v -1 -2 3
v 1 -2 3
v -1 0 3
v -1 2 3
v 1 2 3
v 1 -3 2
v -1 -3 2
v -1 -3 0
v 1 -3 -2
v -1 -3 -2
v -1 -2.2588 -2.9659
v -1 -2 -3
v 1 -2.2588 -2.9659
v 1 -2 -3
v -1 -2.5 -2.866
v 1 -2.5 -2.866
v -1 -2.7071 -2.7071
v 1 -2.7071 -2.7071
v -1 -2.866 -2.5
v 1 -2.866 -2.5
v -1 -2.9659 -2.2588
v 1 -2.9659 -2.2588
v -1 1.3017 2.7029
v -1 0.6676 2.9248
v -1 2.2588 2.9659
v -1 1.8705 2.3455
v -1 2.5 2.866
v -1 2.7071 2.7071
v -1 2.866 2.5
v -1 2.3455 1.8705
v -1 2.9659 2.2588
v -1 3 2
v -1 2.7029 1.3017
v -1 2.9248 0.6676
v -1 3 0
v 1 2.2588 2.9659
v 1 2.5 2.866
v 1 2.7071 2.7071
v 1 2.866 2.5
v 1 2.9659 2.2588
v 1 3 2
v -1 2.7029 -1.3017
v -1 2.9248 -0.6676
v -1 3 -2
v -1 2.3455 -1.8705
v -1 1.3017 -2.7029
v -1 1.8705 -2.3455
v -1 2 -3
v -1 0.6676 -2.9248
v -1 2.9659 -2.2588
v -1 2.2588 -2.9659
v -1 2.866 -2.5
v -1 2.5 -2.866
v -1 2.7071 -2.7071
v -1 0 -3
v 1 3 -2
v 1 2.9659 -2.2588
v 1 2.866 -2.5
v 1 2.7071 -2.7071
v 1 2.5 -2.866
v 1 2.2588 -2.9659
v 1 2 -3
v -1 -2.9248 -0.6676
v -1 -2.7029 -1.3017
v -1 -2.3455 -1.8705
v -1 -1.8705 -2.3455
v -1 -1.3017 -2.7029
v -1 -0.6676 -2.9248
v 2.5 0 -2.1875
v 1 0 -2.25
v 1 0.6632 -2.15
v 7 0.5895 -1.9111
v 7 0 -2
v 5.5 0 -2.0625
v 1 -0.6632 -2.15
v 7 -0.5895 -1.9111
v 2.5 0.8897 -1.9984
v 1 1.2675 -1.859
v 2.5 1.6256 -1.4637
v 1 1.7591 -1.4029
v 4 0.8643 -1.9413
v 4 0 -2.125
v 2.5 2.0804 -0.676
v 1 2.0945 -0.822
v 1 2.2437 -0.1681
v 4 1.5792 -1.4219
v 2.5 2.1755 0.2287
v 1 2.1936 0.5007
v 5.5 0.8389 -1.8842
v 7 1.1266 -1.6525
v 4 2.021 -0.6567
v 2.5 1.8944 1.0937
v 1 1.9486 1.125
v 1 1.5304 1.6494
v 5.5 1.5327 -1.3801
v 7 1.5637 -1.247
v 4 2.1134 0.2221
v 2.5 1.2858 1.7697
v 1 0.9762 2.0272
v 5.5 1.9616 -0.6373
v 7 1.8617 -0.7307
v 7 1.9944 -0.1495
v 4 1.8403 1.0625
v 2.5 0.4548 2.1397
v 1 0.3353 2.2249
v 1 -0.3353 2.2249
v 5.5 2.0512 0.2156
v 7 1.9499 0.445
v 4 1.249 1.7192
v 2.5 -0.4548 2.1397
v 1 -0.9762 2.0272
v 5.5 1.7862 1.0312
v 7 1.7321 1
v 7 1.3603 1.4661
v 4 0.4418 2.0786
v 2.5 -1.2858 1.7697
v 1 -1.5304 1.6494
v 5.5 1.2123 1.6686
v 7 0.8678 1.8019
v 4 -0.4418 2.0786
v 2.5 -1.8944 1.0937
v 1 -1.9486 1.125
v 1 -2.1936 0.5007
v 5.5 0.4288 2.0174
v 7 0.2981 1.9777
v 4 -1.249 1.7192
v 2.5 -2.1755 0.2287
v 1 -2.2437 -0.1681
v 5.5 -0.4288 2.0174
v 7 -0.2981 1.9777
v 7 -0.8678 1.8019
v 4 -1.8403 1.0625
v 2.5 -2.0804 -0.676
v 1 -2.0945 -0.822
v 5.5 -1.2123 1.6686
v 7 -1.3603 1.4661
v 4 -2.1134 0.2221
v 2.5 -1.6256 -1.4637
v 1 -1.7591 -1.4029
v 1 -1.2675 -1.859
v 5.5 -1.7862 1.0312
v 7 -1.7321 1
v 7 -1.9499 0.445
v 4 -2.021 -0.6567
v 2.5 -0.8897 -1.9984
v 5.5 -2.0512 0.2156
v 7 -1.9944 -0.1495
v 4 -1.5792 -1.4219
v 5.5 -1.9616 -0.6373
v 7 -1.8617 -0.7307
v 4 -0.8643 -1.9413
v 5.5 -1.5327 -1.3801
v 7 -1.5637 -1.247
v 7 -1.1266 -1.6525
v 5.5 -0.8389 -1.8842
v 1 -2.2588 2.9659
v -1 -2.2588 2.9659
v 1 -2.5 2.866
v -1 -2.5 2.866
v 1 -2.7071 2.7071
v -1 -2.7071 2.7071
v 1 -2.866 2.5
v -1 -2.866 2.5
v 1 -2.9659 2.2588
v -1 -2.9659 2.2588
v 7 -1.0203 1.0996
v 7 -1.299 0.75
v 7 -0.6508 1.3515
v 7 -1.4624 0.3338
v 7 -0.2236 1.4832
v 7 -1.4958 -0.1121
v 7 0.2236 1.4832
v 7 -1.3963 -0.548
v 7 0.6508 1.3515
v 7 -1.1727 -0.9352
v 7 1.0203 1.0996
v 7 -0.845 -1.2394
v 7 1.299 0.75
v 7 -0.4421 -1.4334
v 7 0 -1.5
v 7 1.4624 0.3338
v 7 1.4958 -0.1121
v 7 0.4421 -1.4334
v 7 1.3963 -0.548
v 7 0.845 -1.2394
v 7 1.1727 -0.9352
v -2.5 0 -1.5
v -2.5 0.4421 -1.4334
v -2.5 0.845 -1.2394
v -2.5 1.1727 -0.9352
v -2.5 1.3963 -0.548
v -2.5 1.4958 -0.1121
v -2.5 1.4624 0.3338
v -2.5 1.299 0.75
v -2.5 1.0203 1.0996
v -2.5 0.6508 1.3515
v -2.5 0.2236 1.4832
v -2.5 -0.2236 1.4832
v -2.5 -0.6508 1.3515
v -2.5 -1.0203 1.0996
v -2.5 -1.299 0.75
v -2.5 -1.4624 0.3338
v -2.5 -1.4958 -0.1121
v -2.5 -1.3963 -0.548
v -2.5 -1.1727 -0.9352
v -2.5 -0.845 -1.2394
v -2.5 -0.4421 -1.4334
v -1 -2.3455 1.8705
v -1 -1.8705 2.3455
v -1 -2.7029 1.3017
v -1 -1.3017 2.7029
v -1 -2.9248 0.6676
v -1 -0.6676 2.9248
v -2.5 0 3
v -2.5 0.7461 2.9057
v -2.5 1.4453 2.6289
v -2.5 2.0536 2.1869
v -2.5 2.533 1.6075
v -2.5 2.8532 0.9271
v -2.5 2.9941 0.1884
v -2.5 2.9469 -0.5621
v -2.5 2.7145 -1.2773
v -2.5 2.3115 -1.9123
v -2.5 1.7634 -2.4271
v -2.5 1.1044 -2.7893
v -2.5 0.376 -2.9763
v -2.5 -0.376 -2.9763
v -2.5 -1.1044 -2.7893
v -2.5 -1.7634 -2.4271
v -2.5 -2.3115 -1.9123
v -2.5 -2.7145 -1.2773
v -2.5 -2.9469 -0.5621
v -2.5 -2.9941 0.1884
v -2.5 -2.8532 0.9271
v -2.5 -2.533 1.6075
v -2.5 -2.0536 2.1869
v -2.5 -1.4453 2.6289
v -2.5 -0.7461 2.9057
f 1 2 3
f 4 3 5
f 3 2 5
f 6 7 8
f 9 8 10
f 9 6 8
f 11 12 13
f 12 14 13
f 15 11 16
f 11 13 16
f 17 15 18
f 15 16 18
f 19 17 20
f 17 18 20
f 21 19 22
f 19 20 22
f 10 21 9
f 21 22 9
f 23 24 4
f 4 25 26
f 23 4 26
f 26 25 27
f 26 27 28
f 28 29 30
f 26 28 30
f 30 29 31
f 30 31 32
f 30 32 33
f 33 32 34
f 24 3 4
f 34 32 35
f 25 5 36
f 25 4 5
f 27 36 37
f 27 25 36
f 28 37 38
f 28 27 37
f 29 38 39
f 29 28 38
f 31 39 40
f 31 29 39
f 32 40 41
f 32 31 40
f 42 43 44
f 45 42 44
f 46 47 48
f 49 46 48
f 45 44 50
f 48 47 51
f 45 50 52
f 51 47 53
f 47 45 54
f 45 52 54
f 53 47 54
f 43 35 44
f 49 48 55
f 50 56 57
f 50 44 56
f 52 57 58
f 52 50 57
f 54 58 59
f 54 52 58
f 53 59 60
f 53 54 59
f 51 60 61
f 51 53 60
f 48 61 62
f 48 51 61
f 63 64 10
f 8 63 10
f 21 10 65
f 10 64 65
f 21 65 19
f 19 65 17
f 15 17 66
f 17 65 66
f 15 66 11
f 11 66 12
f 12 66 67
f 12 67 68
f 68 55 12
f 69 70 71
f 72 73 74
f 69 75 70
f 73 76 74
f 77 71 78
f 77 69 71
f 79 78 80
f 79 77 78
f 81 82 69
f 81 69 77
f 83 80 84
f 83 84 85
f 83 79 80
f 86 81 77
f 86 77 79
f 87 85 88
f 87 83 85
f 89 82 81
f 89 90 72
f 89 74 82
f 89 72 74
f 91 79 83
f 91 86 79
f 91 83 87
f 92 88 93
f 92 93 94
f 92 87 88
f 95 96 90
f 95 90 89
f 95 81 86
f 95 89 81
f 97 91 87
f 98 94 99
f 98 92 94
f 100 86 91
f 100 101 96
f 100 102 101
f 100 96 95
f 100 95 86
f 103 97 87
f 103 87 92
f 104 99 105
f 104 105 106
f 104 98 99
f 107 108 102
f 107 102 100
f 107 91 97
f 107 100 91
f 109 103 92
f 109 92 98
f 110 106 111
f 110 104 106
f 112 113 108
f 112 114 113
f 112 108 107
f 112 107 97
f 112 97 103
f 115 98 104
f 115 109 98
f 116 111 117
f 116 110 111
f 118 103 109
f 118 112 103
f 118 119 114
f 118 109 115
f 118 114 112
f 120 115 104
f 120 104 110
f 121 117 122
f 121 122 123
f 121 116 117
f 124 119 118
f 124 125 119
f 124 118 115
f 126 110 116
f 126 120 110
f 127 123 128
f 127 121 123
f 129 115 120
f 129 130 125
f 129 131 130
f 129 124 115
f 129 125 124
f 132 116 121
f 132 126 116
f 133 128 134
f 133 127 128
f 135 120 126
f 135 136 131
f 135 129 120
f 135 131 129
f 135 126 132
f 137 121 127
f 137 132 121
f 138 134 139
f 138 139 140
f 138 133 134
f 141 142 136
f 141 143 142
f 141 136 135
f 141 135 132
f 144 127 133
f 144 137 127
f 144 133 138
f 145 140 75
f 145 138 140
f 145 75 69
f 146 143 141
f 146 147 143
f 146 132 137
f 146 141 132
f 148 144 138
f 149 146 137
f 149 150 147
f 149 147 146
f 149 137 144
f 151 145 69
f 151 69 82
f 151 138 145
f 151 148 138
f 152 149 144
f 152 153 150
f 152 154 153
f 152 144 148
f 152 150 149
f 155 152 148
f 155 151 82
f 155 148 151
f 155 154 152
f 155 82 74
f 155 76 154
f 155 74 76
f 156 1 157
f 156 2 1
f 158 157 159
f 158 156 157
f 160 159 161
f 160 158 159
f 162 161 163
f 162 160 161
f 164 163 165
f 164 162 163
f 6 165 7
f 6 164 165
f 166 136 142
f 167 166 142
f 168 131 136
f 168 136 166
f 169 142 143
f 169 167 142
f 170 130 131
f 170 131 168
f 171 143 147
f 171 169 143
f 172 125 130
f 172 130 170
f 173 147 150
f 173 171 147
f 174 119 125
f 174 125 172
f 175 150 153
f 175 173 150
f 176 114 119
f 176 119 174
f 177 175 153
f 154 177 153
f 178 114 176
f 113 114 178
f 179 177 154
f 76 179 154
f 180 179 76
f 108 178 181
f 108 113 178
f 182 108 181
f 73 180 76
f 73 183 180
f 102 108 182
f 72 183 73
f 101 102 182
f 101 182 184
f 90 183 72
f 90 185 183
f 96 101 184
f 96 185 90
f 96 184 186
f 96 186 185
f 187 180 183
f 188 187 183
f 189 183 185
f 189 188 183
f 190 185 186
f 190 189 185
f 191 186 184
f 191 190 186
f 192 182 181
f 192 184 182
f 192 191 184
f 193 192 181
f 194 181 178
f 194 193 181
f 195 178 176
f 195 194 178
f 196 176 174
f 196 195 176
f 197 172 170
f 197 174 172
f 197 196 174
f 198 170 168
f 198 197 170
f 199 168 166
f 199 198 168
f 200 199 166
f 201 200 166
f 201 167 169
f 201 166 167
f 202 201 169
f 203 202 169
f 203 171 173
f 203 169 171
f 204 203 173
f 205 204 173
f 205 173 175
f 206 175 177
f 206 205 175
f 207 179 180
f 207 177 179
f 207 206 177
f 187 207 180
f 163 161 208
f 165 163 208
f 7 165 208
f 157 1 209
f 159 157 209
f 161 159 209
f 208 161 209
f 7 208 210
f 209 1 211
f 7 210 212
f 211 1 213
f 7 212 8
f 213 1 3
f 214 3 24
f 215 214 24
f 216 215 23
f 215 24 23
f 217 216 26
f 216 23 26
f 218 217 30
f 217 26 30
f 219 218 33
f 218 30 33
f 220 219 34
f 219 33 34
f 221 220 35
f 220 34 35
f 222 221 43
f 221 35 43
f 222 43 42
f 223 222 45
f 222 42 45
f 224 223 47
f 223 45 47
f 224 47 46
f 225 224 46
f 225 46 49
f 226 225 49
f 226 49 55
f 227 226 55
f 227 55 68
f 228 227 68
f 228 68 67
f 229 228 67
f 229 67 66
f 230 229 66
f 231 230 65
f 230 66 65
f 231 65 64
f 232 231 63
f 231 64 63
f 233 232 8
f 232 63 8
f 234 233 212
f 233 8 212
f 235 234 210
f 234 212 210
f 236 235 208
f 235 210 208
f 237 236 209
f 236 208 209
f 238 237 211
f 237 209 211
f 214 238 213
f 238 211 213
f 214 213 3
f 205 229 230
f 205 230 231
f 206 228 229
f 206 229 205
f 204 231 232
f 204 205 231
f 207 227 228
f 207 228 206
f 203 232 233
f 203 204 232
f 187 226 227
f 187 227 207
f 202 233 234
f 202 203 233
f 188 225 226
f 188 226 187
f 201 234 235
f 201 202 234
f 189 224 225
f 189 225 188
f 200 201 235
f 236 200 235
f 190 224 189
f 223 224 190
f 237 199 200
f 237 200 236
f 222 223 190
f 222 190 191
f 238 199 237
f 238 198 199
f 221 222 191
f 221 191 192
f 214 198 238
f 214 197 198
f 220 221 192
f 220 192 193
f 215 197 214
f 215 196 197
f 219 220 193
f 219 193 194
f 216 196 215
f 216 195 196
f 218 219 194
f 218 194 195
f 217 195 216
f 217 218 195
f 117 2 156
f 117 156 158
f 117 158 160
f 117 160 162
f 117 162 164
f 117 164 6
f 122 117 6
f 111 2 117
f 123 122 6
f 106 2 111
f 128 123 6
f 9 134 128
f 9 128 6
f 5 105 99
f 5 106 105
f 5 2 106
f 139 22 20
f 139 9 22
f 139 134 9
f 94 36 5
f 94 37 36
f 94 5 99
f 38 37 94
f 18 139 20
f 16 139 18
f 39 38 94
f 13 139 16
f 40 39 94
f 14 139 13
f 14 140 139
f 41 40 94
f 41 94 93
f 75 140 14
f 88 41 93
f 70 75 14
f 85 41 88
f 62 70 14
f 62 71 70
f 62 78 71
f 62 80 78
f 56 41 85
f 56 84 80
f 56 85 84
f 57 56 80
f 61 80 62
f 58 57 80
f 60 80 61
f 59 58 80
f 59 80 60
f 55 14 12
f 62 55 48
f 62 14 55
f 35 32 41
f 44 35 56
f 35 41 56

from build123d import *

# Parameters (mm, degrees)
BASES_W                     = 6
BASES_H                     = 6
BASE_DEPTH                  = 1
INSIDEWIREHOLDINGBODYS_R    = 3
INSIDEWIREHOLDINGBODY_DEPTH = 1.5
FRONTFACES_R                = 2.25
REARFACES_R                 = 2
HOLE_DEPTH                  = 9.185352857
HOLE_DEPTH_BACK             = 9.185352857
HOLES_R                     = 1.5
BASEFILLET_R                = 1


with BuildPart() as part:
    # BaseS → Base (new, symmetric)
    with BuildSketch(Plane(origin=(0, 0, 0), x_dir=(0, 0, -1), z_dir=(1, 0, 0))):
        Rectangle(BASES_W, BASES_H)
    extrude(amount=BASE_DEPTH, both=True)

    # InsideWireHoldingBodyS → InsideWireHoldingBody (add)
    with BuildSketch(Plane.ZY.offset(1)):
        Circle(INSIDEWIREHOLDINGBODYS_R)
    extrude(amount=INSIDEWIREHOLDINGBODY_DEPTH)

    # FrontFaceS → StrainReliefBody section 0
    with BuildSketch(Plane(origin=(1, 0, 0), x_dir=(0, 0, -1), z_dir=(1, 0, 0))):
        Circle(FRONTFACES_R)
    # RearFaceS → StrainReliefBody section 1
    with BuildSketch(Plane(origin=(7, 0, 0), x_dir=(0, 0, -1), z_dir=(1, 0, 0))):
        Circle(REARFACES_R)
    loft()

    # HoleS → Hole (cut, two sides: drawn at the far end of the back side and taken through both)
    with BuildSketch(Plane(origin=(0, 0, 0), x_dir=(0, 0, -1), z_dir=(1, 0, 0)).offset(-HOLE_DEPTH_BACK)):
        Circle(HOLES_R)
    extrude(amount=HOLE_DEPTH + HOLE_DEPTH_BACK, mode=Mode.SUBTRACT)

    # BaseFillet
    basefillet_edges = [part.edges().sort_by_distance(p)[0] for p in [
        (0, -3, -3),
        (0, -3, 3),
        (0, 3, 3),
        (0, 3, -3),
    ]]
    fillet(basefillet_edges, radius=BASEFILLET_R)


solid = part.part
